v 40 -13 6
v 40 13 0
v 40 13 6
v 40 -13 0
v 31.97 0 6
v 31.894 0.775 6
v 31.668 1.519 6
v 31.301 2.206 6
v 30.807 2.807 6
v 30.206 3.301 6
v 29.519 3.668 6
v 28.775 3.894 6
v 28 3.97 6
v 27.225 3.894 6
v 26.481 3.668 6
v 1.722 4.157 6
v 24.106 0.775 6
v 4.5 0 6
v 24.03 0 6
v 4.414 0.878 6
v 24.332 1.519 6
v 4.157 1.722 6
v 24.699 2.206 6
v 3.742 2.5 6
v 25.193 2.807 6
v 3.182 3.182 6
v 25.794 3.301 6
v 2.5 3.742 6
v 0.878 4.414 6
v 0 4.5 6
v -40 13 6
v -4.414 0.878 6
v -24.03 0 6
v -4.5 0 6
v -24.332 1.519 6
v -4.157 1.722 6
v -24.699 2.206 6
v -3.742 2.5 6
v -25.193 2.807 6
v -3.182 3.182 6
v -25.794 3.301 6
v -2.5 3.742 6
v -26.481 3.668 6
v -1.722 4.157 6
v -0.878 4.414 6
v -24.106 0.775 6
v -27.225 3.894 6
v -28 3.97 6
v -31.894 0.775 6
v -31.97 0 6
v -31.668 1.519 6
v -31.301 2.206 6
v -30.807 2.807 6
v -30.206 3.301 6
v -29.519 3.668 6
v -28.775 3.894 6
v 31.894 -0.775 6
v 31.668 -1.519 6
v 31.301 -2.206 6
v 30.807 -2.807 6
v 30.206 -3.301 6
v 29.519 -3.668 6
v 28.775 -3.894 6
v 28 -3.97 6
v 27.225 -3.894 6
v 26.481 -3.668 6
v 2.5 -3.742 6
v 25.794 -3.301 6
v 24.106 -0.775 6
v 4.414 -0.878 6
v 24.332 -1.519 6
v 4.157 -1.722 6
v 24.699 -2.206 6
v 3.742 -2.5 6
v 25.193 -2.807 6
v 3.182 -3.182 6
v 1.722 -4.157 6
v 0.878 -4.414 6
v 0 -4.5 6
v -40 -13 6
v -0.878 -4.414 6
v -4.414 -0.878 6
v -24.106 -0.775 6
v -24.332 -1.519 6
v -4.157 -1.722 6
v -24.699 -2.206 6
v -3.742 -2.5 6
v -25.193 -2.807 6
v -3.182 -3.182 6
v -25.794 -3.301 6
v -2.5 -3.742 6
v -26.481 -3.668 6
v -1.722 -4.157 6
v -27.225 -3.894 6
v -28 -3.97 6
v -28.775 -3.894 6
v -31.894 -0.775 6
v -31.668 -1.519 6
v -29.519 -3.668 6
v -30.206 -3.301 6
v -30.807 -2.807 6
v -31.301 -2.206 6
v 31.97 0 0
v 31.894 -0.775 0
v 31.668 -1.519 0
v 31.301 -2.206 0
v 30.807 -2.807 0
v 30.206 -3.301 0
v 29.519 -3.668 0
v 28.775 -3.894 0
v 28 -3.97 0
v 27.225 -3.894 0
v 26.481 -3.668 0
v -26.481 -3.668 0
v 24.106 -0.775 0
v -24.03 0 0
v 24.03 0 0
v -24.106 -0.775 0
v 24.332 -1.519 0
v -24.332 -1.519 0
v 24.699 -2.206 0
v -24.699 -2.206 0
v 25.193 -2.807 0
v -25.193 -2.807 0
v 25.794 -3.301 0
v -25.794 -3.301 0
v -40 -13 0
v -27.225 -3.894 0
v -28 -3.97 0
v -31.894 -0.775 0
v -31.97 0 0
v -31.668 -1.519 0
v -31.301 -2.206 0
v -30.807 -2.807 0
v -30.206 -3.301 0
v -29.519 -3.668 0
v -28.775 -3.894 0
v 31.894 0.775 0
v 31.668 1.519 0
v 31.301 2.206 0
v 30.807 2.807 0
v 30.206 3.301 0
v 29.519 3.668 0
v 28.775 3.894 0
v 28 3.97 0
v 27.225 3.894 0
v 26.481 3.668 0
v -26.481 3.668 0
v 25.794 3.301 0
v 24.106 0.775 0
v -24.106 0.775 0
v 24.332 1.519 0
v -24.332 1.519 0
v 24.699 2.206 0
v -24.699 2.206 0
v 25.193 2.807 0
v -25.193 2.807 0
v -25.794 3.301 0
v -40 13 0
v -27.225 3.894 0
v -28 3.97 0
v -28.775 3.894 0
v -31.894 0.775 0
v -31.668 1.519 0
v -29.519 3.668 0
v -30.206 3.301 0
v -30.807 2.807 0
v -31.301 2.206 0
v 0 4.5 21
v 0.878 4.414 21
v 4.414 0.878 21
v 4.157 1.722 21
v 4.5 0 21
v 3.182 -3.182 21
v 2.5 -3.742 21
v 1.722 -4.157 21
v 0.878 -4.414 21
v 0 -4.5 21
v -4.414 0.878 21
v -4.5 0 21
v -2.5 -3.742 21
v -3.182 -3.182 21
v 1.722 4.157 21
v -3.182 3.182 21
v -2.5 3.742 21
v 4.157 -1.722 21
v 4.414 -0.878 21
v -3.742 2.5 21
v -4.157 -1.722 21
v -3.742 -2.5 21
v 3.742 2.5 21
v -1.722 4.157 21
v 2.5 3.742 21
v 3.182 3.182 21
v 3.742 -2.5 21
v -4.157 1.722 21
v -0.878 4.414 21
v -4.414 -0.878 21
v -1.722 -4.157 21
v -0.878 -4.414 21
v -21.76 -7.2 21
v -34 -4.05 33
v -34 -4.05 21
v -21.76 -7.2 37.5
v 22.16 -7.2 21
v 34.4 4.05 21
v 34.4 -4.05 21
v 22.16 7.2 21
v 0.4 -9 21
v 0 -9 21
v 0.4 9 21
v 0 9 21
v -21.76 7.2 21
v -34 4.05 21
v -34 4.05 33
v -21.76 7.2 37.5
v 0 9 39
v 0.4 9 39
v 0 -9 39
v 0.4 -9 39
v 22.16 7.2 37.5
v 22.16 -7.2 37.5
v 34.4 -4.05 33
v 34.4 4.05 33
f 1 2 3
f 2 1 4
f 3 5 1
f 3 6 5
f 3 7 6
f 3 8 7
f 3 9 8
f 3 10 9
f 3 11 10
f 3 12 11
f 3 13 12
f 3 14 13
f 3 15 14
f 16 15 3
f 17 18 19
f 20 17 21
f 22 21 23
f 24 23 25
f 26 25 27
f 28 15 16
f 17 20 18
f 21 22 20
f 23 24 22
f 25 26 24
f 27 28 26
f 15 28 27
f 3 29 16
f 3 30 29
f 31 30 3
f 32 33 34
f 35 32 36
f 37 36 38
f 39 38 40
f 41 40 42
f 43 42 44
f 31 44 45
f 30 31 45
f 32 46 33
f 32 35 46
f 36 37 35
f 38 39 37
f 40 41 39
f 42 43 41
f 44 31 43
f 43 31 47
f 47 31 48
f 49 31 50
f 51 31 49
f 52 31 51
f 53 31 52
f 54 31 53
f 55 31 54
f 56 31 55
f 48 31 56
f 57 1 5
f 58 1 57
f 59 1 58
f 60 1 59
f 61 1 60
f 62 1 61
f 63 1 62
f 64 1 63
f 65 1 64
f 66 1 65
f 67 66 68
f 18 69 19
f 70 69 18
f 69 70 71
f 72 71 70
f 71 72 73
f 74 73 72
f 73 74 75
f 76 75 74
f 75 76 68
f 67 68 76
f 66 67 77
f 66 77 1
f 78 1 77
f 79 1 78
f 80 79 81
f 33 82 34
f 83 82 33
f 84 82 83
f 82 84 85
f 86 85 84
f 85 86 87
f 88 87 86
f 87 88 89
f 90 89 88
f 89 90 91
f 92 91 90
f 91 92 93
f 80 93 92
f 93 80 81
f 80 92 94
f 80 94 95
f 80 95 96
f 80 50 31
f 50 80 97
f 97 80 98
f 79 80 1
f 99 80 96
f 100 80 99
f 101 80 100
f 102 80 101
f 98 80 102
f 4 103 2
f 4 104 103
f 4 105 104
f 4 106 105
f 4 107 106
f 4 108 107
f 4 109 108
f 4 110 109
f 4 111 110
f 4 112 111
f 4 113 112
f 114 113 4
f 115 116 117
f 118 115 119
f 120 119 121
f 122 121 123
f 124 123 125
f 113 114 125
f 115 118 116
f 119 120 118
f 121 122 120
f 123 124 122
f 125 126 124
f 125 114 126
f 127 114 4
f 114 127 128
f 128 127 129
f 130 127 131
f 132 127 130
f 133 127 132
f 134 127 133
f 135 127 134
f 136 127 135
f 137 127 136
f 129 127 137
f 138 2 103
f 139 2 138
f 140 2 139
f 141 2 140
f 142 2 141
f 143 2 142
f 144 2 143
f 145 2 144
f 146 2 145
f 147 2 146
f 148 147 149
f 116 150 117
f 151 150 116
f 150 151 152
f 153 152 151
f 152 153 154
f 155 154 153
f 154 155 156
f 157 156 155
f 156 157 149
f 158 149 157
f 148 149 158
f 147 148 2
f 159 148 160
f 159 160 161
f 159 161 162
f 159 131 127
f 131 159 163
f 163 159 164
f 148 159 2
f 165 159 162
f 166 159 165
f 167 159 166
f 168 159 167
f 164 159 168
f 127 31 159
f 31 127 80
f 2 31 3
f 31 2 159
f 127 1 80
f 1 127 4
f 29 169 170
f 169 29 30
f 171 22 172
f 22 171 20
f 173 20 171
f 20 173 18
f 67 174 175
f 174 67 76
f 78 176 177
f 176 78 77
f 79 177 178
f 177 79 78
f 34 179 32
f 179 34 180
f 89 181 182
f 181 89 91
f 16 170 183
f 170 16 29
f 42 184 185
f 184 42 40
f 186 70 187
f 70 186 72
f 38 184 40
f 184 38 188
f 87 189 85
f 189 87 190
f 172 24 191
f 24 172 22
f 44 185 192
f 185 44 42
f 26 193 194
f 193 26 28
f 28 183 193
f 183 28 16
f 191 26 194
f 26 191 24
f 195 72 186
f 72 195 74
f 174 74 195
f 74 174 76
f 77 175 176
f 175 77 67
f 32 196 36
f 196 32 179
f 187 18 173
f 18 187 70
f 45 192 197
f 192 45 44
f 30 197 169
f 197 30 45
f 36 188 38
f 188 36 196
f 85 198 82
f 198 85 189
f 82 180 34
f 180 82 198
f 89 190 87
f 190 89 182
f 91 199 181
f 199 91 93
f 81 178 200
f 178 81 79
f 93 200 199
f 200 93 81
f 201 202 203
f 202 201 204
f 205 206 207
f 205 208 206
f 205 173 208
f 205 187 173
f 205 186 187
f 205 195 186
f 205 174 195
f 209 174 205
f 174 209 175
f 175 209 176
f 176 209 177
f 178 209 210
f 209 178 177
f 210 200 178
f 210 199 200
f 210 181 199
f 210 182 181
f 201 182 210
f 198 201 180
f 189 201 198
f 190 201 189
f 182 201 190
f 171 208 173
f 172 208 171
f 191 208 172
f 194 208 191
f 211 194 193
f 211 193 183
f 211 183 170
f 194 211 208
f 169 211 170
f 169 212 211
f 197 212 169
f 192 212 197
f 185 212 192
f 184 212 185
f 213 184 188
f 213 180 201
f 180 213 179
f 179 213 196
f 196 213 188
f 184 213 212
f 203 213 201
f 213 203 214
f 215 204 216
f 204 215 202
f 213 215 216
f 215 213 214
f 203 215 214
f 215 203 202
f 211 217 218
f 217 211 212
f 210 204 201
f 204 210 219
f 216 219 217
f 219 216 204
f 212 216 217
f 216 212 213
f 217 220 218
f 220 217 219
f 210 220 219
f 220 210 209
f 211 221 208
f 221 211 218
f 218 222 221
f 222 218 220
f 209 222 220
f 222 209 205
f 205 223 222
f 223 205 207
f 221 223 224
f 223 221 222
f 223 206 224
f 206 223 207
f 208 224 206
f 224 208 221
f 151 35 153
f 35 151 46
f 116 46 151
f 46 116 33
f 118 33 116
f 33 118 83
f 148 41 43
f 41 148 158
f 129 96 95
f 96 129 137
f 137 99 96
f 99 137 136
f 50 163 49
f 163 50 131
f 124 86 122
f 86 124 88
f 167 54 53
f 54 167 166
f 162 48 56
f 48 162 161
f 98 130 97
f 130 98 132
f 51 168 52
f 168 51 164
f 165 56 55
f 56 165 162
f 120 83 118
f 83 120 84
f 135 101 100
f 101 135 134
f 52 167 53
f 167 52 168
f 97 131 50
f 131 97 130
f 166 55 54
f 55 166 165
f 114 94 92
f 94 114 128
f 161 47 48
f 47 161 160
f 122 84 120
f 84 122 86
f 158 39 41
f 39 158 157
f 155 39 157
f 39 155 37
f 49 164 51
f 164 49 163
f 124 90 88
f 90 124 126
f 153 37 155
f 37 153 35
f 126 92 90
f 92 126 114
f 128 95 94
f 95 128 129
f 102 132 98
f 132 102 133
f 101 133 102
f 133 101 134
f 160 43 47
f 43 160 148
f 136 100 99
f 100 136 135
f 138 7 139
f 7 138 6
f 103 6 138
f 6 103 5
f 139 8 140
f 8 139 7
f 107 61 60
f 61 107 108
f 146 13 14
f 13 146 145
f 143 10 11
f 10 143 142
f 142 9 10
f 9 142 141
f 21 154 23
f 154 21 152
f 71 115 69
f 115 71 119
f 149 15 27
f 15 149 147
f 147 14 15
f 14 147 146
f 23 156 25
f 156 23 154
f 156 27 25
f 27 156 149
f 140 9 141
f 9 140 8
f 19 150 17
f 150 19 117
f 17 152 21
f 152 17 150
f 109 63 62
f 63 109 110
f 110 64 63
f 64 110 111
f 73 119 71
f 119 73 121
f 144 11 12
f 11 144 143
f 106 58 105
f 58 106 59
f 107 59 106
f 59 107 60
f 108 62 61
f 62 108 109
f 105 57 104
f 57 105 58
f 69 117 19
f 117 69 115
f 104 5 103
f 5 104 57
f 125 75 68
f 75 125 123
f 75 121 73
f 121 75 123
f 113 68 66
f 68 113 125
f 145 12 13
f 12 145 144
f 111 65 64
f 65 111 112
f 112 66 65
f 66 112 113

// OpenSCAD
$fn = 32;

// ----------------------------------------------------------------------
// Boat cleat: 80 mm base, horn 30 mm up
// ----------------------------------------------------------------------

// --- parameters (mm) ---
base_l = 80;              // base length
base_w = 26;              // base width
base_t = 6;               // base thickness
horn_len = 68;            // horn length
horn_d = 18;              // horn diameter at the middle
horn_z = 30;              // horn axis height
end_drop = 6;             // how far the horn tips drop
post_d = 9;               // centre post diameter
holes_d = 7.94;           // fixing holes
hole_x = 28;              // fixing hole spacing

difference() {
  union() {
    translate([-40, -13, 0]) cube([base_l, base_w, base_t]);
    /* centre post, sunk 1 mm into the base */
    translate([0, 0, 5]) cylinder(h = 25, d = post_d);
    /* horn: a hull chain of boxes, full in the middle and lighter at the tips */
    hull() {
      translate([-34, -4.05, 21]) cube([0.4, 8.1, 12], center = false);
      translate([-21.76, -7.2, 21]) cube([0.4, 14.4, 16.5], center = false);
    }
    hull() {
      translate([-21.76, -7.2, 21]) cube([0.4, 14.4, 16.5], center = false);
      translate([0, -9, 21]) cube([0.4, 18, 18], center = false);
    }
    hull() {
      translate([0, -9, 21]) cube([0.4, 18, 18], center = false);
      translate([21.76, -7.2, 21]) cube([0.4, 14.4, 16.5], center = false);
    }
    hull() {
      translate([21.76, -7.2, 21]) cube([0.4, 14.4, 16.5], center = false);
      translate([34, -4.05, 21]) cube([0.4, 8.1, 12], center = false);
    }
  }
  translate([-28, 0, -2.5]) cylinder(h = base_t + 5, d = holes_d);
  translate([28, 0, -2.5]) cylinder(h = base_t + 5, d = holes_d);
}
